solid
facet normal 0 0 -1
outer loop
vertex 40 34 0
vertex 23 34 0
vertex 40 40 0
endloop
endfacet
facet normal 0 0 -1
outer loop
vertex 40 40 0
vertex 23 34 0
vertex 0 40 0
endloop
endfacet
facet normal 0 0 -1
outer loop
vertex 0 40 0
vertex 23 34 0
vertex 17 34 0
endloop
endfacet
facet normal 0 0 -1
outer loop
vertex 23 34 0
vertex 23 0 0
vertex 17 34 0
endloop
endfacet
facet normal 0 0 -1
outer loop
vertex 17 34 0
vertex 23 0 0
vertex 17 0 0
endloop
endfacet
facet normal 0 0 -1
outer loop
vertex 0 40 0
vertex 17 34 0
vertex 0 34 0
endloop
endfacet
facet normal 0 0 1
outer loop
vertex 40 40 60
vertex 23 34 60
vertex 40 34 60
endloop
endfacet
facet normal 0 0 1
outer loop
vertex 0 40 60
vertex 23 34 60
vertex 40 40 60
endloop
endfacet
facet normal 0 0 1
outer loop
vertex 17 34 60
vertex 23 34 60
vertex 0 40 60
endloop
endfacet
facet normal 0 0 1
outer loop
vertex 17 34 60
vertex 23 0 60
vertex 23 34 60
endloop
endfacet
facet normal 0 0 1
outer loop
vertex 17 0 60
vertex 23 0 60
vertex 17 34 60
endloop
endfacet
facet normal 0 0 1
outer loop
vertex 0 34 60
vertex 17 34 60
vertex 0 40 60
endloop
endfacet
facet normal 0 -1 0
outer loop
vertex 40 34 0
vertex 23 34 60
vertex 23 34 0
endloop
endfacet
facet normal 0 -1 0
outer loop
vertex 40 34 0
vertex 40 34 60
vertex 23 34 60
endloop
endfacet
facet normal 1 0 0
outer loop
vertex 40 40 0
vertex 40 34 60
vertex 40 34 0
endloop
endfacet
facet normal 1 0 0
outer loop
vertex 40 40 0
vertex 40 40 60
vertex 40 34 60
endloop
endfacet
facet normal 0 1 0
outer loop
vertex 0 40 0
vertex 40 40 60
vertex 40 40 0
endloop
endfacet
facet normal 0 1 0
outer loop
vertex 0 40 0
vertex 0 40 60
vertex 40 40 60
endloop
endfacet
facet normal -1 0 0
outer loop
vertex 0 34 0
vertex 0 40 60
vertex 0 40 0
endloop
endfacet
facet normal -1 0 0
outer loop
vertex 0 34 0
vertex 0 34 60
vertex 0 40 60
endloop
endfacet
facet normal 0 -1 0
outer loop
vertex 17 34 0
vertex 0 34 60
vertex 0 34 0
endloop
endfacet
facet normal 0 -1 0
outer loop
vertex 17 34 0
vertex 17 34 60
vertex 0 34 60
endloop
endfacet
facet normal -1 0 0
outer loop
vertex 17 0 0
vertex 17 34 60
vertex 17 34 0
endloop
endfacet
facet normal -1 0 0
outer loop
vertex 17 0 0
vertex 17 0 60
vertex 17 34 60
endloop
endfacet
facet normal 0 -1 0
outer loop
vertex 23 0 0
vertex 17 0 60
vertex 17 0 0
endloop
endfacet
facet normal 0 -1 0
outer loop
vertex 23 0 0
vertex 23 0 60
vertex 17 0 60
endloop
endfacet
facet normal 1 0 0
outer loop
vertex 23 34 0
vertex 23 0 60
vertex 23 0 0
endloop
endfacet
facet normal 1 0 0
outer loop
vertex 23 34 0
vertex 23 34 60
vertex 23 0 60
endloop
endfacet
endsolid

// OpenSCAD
$fn = 32;

// ----------------------------------------------------------------------
// Structural section: tee 40 x 40 mm
// ----------------------------------------------------------------------

// --- parameters (mm) ---
sec_w = 40;               // tee width, X
sec_h = 40;               // tee height, Y
flange_t = 6;             // top flange thickness
web_t = 6;                // web thickness
plate_t = 60;             // cut length, Z (extrusion height)

profile = [[17, 0], [23, 0], [23, 34], [40, 34], [40, 40], [0, 40], [0, 34], [17, 34]];  // primary outline, 8 points, counter clockwise

// --- the one profile operation ---
linear_extrude(height = plate_t) polygon(points = profile);
